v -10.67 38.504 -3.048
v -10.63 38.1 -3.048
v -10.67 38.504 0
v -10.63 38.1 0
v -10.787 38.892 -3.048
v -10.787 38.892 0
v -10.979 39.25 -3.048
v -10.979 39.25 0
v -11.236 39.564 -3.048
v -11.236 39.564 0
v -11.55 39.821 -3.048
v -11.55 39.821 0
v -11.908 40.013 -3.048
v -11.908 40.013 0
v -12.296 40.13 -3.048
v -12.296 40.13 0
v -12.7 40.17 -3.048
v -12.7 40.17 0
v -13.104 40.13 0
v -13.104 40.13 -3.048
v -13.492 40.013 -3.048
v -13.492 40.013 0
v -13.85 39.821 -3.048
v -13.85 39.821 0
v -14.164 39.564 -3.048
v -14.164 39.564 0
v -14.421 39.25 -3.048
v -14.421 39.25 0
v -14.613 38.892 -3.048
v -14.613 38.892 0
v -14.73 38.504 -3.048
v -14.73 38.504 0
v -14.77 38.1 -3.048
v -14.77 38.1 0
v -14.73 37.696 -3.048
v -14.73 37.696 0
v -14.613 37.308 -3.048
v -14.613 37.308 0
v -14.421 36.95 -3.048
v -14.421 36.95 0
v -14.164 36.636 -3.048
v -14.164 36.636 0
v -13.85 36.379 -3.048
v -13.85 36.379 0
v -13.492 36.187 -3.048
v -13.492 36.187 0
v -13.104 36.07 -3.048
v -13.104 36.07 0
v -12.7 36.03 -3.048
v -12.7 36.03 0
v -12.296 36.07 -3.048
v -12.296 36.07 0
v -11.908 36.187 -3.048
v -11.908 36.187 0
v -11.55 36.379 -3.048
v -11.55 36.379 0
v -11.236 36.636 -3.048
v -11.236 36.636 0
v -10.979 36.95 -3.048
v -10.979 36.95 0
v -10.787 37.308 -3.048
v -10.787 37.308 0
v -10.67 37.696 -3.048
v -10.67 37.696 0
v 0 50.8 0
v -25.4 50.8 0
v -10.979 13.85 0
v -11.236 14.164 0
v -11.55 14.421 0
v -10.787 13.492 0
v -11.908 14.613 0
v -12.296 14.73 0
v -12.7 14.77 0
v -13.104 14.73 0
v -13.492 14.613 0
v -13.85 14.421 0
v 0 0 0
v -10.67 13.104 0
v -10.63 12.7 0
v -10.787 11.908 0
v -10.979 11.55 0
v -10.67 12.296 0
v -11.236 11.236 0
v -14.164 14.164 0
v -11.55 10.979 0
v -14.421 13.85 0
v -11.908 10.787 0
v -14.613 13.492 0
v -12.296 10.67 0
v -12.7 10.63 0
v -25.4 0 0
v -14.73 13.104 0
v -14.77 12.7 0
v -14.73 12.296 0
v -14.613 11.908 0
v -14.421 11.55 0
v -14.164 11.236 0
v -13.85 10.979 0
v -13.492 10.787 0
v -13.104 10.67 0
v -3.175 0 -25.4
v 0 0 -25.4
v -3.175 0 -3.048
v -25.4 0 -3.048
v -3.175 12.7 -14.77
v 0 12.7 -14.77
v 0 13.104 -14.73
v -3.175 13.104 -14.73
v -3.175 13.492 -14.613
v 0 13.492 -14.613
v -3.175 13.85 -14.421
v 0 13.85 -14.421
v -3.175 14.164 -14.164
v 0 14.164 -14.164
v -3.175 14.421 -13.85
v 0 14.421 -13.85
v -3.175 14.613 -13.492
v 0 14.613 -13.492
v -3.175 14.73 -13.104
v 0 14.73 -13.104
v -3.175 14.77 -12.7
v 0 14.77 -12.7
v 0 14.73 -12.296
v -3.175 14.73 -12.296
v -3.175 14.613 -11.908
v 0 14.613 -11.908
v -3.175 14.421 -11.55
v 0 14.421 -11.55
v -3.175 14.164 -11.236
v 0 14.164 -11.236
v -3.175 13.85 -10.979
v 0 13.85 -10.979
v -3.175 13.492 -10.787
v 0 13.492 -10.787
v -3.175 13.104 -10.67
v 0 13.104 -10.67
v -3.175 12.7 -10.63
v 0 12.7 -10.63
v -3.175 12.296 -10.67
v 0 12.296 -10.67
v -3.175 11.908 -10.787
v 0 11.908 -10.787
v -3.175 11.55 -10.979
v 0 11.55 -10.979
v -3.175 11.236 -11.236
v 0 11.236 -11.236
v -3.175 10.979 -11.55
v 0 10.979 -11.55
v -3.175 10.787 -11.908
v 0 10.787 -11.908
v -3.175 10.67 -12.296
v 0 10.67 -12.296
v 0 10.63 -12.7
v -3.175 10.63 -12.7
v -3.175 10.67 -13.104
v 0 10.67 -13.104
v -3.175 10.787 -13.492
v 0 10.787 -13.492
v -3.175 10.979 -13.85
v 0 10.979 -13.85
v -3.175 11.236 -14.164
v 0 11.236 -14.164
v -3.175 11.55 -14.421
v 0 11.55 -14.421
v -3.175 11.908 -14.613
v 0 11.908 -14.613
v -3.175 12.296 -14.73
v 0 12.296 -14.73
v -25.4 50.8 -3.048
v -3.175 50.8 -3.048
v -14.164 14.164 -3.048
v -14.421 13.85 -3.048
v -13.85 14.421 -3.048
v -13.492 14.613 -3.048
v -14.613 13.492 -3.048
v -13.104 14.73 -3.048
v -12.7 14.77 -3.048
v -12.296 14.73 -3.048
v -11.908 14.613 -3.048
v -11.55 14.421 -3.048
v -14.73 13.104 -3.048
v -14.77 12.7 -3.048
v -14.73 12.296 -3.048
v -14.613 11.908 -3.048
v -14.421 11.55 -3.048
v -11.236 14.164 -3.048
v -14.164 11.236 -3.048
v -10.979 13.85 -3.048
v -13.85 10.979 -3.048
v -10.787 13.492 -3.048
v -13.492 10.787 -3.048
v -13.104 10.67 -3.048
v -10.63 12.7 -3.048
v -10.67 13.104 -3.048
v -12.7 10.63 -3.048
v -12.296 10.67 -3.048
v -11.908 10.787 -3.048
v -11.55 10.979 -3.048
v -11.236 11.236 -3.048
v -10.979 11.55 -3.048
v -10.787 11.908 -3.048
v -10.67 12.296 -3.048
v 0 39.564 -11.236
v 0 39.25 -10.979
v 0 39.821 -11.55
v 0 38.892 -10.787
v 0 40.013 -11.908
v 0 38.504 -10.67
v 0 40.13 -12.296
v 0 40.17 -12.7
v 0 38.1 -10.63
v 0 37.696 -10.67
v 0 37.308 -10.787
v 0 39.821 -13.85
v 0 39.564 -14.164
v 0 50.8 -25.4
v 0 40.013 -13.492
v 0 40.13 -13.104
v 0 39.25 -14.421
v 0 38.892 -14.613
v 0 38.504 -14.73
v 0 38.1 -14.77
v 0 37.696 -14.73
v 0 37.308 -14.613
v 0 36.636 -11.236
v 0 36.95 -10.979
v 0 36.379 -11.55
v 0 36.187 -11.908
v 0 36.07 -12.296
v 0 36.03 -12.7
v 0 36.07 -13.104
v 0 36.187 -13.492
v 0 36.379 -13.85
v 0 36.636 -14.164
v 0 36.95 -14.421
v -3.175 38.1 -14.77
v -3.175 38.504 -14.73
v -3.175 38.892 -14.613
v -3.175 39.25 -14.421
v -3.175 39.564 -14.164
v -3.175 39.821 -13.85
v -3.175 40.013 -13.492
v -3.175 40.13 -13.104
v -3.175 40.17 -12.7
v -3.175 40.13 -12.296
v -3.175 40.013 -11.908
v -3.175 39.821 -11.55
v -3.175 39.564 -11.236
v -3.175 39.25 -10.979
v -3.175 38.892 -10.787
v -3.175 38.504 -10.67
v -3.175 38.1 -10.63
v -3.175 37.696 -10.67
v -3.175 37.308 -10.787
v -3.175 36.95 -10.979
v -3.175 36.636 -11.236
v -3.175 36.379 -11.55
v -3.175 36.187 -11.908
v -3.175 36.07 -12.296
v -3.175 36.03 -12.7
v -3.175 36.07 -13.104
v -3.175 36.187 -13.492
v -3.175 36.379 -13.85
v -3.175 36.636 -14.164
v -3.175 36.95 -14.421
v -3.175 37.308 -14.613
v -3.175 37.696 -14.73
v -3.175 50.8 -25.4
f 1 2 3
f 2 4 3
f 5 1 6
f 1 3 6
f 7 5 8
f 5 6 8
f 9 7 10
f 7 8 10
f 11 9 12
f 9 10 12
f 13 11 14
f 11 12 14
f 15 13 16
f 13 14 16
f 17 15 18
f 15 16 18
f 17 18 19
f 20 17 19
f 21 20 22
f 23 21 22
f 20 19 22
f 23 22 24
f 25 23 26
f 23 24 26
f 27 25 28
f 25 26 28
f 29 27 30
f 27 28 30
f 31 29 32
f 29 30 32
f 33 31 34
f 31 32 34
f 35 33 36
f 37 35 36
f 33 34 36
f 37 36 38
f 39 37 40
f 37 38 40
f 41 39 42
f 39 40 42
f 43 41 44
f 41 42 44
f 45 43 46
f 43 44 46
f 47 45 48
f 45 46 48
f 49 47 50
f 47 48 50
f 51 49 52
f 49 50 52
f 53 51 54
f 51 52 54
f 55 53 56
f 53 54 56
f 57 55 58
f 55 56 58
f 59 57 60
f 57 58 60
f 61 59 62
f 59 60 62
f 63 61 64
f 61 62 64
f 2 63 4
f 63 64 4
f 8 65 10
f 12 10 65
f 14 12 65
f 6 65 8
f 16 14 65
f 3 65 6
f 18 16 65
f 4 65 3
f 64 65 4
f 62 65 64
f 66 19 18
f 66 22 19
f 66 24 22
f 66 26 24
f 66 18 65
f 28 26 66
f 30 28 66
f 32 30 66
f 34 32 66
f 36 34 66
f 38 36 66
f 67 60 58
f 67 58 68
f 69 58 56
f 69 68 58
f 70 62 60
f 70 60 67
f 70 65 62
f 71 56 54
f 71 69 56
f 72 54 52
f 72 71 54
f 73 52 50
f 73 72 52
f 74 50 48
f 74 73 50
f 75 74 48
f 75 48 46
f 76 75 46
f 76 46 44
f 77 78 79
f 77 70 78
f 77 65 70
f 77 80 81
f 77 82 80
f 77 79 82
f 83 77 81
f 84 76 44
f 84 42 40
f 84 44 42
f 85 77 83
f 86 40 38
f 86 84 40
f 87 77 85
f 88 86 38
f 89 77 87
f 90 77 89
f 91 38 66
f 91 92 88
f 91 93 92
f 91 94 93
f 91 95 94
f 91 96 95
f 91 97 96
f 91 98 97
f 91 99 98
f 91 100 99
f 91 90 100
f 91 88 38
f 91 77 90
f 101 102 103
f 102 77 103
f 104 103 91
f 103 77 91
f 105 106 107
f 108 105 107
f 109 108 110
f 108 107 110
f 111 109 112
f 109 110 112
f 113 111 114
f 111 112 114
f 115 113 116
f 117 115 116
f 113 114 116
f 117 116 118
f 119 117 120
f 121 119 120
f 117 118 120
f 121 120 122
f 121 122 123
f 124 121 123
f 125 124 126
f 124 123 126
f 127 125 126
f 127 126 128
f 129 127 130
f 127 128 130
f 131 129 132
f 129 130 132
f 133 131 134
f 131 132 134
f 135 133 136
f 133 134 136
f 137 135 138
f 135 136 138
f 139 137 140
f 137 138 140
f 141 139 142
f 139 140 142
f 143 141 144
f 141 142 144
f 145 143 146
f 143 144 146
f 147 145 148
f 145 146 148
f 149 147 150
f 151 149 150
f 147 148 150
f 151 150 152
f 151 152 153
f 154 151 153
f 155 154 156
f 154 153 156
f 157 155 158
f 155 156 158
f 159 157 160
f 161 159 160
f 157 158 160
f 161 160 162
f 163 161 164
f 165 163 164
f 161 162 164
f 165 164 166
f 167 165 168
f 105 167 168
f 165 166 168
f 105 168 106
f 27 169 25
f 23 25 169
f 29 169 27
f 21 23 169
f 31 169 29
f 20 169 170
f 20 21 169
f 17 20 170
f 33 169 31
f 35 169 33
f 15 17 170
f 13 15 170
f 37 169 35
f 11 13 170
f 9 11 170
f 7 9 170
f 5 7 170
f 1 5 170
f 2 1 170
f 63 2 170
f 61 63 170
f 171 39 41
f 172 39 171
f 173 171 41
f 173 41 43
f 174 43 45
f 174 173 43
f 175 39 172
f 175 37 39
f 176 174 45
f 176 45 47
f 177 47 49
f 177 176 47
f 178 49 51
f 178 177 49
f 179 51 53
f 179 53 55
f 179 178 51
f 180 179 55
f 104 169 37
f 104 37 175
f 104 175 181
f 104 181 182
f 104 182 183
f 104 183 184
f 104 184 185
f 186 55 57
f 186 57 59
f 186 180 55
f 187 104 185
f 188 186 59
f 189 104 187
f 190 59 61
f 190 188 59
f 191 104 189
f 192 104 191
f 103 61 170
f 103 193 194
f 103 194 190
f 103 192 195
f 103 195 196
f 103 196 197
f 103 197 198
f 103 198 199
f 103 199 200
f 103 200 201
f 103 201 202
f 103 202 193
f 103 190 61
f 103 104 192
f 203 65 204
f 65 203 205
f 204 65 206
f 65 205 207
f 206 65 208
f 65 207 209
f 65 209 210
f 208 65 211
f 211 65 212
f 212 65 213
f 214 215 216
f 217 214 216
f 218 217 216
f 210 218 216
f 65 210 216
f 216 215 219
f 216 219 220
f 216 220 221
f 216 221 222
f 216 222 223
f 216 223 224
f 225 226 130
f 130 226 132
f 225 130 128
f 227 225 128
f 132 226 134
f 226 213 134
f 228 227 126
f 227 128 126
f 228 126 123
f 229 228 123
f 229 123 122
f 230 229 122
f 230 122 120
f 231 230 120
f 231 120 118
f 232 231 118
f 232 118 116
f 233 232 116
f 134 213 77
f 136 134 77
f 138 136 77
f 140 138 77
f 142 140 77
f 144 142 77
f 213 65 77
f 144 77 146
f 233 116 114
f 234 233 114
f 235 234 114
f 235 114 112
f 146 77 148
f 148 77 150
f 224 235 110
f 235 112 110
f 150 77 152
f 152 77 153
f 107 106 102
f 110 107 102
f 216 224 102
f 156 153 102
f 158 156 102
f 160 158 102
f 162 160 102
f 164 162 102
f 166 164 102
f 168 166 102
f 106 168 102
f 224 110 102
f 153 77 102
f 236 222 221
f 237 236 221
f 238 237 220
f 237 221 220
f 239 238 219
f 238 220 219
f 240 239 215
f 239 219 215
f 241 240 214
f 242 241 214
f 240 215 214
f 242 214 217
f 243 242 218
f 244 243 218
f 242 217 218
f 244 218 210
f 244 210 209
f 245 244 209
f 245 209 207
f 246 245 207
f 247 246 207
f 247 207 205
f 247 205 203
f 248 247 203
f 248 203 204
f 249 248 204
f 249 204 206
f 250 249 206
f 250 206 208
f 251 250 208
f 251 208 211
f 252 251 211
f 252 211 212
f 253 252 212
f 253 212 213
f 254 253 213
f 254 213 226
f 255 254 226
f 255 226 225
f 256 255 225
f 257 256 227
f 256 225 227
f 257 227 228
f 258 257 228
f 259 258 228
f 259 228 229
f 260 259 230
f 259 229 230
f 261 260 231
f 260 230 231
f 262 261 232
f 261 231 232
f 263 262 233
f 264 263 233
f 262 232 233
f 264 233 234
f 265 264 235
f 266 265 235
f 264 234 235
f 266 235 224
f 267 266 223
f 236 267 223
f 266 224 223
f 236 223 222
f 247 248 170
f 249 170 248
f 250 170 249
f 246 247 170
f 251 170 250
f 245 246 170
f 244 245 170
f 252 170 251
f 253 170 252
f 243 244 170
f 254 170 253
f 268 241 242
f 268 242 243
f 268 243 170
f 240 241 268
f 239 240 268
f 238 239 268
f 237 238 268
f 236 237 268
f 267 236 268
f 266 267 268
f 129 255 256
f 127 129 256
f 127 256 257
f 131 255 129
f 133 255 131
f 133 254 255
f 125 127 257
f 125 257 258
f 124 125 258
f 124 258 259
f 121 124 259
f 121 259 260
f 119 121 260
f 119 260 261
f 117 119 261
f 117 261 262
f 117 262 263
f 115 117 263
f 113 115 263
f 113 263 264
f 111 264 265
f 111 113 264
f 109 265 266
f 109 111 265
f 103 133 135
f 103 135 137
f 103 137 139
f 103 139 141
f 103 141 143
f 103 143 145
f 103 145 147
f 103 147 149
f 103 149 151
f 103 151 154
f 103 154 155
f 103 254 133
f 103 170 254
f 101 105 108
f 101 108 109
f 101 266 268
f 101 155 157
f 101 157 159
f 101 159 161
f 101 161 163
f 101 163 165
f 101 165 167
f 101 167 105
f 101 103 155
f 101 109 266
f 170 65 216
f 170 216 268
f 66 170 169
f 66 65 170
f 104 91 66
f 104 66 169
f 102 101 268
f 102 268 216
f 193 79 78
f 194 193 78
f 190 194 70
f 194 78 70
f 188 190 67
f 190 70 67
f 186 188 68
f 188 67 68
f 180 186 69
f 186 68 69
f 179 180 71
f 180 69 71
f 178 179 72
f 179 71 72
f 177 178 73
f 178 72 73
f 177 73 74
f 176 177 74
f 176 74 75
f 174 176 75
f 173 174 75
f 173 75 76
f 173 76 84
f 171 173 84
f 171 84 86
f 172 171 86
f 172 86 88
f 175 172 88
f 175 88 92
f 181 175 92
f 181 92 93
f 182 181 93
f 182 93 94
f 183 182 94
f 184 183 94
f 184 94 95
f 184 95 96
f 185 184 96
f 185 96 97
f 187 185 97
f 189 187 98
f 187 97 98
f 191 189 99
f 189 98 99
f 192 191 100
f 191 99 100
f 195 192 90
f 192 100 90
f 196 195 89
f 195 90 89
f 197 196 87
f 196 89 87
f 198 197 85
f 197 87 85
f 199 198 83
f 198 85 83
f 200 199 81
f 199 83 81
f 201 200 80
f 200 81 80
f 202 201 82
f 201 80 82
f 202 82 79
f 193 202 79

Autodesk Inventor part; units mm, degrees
ref_plane "YZ Plane" through (0, 0, 0) normal (1, 0, 0) x (0, 1, 0)
ref_plane "XZ Plane" through (0, 0, 0) normal (0, 1, 0) x (-1, 0, 0)
ref_plane "XY Plane" through (0, 0, 0) normal (0, 0, 1) x (1, 0, 0)
sketch "Sketch1" plane through (0, 0, 0) normal (0, 1, 0) x (-1, 0, 0)
  line L0 (0, 0) -> (0, -25.4)
  line L1 (0, -25.4) -> (0, 0)
  line L2 (0, 0) -> (25.4, 0)
  line L3 (25.4, 0) -> (25.4, -3.048)
  line L4 (25.4, -3.048) -> (3.175, -3.048)
  line L5 (3.175, -3.048) -> (3.175, -25.4)
  line L6 (3.175, -25.4) -> (0, -25.4)
  dimension "d0" = 25.4
  dimension "d1" = 25.4
  dimension "d2" = 3.048
  dimension "d3" = 3.175
extrude "Extrusion1" add sketch "Sketch1" along normal blind 50.8
sketch "Sketch2" plane through (-25.4, 0, 0) normal (0, 0, 1) x (1, 0, 0)
  line L0 (22.225, 50.8) -> (0, 50.8) construction
  line L1 (22.225, 0) -> (0, 0) construction
  line L2 (12.7, 50.8) -> (12.7, 0) construction
  line L3 (0, 0) -> (0, 50.8) construction
  circle A0 centre (12.7, 12.7) radius 2.0701
  circle A1 centre (12.7, 38.1) radius 2.0701
  line L4 (25.4, 0) -> (25.4, 50.8) projected
  dimension "d7" = 4.1402
  dimension "d8" = 4.1402
  dimension "d9" = 25.4
  dimension "d10" = 12.7
  dimension "d16" = 12.7
sketch "Sketch3" plane through (0, 0, 0) normal (1, 0, 0) x (0, 0, -1)
  line L0 (0, 0) -> (25.4, 0) projected
  line L1 (25.4, 0) -> (25.4, 50.8) projected
  line L2 (0, 50.8) -> (25.4, 50.8) projected
  line L3 (0, 0) -> (0, 50.8) projected
  circle A0 centre (12.7, 38.1) radius 2.0701
  circle A1 centre (12.7, 12.7) radius 2.0701
  dimension "d11" = 4.1402
  dimension "d12" = 4.1402
  dimension "d13" = 12.7
  dimension "d14" = 12.7
  dimension "d15" = 25.4
extrude "Extrusion2" cut sketch "Sketch2" against normal through all
extrude "Extrusion3" cut sketch "Sketch3" against normal blind 25.4 contours A0 | A1
properties part number "LBracketConnectors"
